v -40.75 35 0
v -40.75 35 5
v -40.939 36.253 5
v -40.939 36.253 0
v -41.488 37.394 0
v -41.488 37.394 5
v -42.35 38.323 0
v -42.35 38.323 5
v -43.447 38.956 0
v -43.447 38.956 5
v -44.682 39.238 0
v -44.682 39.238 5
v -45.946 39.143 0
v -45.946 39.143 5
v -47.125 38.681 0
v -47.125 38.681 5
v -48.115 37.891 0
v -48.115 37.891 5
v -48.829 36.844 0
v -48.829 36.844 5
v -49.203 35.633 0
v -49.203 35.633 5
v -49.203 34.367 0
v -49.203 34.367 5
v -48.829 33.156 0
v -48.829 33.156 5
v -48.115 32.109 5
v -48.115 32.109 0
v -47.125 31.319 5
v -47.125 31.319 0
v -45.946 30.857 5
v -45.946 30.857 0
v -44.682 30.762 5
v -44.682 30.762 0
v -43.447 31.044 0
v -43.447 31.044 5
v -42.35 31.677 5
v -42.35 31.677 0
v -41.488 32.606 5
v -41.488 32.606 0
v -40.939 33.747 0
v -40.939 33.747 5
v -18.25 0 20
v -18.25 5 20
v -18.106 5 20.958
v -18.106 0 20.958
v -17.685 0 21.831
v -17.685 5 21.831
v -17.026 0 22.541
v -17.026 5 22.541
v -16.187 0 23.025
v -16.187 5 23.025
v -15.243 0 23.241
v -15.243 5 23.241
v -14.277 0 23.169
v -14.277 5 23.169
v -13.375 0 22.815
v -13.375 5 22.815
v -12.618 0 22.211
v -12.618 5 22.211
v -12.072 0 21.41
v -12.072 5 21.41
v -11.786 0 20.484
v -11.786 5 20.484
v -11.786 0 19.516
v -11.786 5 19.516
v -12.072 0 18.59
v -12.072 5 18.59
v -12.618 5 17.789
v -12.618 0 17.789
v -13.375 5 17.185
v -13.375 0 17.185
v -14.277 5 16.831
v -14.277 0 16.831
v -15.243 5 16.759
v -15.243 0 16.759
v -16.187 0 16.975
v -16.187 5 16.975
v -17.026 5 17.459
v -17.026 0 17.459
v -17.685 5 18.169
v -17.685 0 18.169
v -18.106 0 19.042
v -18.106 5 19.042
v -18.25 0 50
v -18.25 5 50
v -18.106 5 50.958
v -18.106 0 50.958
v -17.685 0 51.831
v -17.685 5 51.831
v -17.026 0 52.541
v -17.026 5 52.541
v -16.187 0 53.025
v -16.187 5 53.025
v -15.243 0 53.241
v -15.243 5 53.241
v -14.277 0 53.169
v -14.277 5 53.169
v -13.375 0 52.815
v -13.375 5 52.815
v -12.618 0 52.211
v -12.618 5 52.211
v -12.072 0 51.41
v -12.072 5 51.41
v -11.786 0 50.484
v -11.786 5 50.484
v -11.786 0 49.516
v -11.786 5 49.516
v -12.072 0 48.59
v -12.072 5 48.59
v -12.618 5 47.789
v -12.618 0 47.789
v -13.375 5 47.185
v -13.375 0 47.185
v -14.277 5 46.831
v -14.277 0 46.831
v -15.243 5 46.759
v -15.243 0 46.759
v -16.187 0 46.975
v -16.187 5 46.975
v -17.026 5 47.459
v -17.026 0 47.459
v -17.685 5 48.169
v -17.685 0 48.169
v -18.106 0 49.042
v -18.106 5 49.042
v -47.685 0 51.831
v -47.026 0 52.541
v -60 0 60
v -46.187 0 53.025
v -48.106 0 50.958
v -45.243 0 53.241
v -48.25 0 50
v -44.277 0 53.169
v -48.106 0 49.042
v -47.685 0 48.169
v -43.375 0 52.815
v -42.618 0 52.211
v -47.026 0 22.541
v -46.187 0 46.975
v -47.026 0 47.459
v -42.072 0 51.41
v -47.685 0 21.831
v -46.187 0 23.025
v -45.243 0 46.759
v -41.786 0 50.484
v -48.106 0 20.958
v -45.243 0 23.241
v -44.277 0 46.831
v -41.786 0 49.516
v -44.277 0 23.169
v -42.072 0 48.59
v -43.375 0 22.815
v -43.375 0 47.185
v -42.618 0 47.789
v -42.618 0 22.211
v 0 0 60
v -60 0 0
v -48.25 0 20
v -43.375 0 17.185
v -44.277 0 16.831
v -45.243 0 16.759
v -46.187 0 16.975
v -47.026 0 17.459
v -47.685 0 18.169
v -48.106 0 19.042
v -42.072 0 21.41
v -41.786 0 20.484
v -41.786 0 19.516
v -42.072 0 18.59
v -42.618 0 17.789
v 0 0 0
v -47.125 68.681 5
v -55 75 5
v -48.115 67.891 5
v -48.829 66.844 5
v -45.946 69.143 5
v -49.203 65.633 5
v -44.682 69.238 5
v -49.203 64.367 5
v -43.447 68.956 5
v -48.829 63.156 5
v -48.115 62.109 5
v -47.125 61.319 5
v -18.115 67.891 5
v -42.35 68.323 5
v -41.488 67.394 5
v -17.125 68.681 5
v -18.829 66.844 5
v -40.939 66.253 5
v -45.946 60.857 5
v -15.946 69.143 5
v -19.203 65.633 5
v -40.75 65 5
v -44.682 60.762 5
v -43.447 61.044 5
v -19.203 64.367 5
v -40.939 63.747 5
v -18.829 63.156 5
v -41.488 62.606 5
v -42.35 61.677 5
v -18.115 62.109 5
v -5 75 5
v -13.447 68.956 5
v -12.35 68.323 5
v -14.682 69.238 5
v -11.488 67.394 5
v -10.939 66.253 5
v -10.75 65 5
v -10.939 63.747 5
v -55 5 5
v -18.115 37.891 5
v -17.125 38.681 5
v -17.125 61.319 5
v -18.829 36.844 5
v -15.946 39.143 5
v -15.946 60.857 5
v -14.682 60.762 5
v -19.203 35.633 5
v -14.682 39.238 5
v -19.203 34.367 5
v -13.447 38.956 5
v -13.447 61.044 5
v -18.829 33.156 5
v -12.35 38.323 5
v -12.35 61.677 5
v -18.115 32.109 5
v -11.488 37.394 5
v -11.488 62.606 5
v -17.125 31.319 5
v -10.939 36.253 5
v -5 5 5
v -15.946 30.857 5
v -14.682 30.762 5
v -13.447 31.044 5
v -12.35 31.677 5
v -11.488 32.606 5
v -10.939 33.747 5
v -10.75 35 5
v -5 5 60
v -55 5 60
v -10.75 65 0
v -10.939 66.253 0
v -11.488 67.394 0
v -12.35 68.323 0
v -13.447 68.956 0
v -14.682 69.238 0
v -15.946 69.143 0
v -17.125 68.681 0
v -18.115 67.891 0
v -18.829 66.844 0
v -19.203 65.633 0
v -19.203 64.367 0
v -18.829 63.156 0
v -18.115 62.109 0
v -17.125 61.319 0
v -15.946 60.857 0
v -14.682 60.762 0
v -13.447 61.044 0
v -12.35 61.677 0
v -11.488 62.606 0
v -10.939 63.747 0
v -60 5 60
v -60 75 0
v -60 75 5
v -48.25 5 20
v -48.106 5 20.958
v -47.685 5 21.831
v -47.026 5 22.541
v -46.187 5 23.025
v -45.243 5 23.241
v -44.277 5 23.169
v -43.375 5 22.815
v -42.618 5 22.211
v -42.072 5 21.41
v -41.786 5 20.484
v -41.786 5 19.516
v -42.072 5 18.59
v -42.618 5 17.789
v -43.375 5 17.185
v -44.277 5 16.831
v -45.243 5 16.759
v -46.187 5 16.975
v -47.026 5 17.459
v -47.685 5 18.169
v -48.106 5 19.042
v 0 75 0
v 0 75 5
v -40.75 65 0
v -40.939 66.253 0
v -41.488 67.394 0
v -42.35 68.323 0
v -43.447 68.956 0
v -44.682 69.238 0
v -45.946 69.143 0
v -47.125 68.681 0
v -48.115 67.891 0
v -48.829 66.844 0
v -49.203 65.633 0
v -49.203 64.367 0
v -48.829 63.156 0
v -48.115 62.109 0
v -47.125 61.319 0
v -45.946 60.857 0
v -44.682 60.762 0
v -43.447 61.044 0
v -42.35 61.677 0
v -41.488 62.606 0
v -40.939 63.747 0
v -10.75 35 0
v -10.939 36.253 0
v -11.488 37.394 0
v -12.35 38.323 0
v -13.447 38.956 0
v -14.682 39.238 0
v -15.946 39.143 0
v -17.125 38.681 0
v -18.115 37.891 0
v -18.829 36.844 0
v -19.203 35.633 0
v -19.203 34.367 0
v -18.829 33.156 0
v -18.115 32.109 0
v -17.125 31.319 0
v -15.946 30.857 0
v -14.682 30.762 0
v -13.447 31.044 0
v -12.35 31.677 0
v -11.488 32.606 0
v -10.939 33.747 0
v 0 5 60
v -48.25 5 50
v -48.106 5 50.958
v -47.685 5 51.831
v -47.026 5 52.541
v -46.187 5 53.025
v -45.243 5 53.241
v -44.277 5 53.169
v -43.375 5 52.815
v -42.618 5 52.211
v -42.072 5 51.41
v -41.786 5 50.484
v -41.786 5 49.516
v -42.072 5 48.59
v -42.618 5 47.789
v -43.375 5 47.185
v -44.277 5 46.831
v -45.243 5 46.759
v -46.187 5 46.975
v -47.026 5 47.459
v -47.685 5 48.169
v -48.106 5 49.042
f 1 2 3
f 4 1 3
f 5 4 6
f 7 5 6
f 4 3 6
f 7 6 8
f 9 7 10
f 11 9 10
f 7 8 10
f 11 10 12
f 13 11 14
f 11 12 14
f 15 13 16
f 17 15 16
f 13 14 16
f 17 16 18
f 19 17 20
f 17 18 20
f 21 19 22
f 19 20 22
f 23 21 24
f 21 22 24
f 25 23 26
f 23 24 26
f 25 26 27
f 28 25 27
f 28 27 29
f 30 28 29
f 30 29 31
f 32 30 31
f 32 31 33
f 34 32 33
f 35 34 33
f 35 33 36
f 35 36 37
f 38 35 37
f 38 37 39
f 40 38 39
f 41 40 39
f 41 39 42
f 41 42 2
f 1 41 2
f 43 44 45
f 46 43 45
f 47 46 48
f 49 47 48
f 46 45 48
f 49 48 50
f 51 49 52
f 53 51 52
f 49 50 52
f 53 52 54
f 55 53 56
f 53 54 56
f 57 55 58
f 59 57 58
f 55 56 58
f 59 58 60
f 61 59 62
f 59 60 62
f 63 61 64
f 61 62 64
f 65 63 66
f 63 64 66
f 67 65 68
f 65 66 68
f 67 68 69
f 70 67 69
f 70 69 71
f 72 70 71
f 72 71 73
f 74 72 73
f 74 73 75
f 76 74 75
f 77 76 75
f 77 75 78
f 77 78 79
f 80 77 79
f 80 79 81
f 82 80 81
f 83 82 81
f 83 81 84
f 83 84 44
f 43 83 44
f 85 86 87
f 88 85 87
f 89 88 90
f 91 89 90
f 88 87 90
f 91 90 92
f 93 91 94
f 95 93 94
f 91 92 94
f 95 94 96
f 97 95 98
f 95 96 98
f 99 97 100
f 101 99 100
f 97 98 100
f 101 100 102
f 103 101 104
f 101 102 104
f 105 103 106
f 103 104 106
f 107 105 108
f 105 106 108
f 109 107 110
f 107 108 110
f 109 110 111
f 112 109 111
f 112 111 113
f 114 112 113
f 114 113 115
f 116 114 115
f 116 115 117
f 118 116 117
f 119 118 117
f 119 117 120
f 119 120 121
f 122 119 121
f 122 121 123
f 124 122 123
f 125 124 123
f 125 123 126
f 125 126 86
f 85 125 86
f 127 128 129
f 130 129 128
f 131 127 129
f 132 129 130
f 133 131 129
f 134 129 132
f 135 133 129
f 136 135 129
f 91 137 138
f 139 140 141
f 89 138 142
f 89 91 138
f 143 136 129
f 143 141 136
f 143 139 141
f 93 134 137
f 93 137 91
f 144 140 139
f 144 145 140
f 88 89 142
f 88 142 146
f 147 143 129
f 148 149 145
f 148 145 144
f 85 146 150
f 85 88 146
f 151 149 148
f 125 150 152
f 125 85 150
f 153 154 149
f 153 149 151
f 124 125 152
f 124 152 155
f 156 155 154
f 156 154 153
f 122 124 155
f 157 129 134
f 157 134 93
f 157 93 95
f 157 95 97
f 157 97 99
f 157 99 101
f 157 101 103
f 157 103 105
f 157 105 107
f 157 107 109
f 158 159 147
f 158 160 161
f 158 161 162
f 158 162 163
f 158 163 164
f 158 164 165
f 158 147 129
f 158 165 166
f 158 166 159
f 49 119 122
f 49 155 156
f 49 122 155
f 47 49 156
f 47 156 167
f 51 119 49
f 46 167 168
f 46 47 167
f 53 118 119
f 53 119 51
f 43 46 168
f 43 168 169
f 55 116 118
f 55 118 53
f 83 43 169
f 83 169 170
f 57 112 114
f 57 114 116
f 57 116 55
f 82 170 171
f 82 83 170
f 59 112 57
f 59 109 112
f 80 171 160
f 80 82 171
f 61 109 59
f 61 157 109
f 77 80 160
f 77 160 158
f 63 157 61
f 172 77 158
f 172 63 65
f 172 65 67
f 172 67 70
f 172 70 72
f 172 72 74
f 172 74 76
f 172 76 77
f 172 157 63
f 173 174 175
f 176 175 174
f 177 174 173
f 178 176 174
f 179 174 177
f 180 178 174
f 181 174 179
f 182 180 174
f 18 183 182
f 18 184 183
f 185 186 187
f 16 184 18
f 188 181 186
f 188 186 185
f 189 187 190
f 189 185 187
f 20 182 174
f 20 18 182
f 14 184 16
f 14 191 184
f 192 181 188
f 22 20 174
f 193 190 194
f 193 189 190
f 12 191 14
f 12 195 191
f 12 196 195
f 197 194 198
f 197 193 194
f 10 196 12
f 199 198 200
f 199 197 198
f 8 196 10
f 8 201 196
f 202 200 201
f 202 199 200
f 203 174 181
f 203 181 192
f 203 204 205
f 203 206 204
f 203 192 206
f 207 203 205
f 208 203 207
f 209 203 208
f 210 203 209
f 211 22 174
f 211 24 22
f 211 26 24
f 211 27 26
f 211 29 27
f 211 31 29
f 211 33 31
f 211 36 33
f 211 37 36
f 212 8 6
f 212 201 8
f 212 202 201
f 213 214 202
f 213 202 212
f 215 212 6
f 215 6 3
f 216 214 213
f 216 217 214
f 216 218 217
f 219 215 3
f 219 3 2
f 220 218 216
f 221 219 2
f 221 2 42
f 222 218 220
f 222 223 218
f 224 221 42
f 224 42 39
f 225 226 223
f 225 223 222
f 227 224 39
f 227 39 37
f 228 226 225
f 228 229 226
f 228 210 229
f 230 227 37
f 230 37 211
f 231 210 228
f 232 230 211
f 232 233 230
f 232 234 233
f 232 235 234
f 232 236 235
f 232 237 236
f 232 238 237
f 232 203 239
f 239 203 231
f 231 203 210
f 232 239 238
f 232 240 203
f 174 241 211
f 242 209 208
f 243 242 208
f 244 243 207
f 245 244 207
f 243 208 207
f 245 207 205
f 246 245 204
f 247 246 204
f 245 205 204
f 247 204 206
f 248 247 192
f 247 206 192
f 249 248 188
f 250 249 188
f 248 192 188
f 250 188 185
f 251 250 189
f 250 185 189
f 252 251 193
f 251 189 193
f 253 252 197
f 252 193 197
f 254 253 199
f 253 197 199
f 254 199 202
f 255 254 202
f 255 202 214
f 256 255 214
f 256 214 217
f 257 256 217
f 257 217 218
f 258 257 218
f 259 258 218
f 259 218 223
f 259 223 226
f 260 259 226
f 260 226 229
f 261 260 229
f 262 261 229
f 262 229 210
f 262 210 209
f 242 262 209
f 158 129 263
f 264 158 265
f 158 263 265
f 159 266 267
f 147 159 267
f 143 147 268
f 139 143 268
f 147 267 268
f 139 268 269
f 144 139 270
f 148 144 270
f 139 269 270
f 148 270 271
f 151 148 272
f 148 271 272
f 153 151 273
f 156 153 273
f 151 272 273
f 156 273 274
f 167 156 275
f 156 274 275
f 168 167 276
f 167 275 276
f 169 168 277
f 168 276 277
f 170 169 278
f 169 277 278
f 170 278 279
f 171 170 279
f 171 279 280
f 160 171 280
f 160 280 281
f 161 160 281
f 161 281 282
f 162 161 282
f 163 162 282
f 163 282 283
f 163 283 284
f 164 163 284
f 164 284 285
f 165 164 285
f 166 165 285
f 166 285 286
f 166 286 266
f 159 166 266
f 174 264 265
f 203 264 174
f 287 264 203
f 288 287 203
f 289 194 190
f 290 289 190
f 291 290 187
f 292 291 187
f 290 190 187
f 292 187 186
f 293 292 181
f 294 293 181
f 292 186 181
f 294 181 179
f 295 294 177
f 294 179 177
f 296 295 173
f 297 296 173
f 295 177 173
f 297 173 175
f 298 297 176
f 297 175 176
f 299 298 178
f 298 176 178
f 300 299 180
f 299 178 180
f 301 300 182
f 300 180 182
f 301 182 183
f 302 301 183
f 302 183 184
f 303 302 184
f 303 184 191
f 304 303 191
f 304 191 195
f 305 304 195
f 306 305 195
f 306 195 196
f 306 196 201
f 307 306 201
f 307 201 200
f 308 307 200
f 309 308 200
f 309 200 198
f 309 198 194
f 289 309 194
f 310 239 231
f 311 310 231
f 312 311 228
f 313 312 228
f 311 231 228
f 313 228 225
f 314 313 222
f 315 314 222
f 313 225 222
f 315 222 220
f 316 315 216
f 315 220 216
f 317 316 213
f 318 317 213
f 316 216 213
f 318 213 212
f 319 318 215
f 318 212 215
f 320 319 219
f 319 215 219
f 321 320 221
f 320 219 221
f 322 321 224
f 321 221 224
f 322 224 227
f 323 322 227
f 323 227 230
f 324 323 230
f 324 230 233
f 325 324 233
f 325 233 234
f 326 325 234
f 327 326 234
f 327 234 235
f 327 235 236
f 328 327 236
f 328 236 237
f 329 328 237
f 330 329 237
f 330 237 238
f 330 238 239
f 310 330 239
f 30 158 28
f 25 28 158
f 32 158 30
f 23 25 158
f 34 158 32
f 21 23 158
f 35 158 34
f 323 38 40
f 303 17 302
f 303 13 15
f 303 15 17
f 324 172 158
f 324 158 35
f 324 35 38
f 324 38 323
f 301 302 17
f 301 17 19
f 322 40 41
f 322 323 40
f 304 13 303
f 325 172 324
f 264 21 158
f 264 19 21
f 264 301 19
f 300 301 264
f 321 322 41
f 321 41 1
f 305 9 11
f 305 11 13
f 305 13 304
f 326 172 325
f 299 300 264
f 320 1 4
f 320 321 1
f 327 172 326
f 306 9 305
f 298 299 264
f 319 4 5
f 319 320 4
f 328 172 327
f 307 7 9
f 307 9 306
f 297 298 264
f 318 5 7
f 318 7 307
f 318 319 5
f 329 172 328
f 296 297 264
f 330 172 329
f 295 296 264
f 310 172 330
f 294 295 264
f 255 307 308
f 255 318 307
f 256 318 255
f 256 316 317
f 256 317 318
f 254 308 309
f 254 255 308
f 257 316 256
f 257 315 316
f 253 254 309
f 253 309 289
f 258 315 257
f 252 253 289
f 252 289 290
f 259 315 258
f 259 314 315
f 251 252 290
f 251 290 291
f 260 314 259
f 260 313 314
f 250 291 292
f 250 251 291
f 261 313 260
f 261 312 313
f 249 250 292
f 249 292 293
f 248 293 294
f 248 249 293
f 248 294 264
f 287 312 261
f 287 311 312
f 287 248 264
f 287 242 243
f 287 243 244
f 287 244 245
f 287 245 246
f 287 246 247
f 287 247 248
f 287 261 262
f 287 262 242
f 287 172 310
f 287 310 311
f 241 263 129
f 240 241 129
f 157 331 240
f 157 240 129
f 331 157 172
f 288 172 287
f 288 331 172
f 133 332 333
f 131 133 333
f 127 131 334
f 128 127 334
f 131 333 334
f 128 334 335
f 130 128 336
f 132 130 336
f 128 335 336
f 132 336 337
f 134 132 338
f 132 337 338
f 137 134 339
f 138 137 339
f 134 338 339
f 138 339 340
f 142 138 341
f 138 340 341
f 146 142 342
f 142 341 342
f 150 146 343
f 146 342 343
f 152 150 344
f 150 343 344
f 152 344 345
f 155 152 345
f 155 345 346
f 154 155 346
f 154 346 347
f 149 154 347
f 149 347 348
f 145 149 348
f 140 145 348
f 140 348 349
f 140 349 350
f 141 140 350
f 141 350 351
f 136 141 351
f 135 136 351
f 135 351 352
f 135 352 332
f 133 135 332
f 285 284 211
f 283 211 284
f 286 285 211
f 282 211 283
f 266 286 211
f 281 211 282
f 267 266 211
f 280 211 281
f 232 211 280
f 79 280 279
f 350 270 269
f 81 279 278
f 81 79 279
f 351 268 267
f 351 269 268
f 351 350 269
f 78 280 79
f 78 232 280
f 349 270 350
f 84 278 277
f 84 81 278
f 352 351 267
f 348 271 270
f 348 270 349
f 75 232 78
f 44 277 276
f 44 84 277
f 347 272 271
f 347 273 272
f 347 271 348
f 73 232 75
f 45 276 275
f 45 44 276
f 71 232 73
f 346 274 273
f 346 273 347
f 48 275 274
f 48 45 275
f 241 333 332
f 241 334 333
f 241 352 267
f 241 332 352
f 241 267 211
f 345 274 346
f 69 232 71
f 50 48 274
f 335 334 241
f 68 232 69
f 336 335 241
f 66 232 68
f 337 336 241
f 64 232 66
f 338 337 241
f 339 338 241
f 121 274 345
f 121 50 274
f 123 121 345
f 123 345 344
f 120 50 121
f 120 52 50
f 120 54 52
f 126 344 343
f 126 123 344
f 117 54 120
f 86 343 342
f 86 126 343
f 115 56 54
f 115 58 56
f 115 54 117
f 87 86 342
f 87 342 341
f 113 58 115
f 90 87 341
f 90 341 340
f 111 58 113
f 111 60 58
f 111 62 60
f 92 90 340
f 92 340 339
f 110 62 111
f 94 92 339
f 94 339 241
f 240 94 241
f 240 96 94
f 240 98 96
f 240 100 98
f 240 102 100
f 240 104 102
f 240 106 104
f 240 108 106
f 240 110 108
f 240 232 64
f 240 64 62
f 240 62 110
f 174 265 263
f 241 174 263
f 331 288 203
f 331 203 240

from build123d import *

# Parameters (mm, degrees)
F1_DEPTH  = 60
F3_DEPTH  = 5
F6_DEPTH  = 5
F7_R      = 4.25
F8_DEPTH  = 25
F9_R      = 3.25
F10_DEPTH = 25


with BuildPart() as f1:
    # F0 (on Right) → F1 (new body)
    with BuildSketch(Plane.YZ):
        Polygon((0, 60), (0, 0), (75, 0), (75, 5), (5, 5), (5, 60), align=None)
    extrude(amount=-F1_DEPTH)

    # F2 (on Right) → F3 (join)
    with BuildSketch(Plane.YZ):
        Polygon((75, 5), (5, 60), (5, 5), align=None)
    extrude(amount=-F3_DEPTH)

    # F5 (on offset) → F6 (join)
    with BuildSketch(Plane.YZ.offset(-60)):
        Polygon((75, 5), (5, 60), (5, 5), align=None)
    extrude(amount=F6_DEPTH)

    # F7 (on face) → F8 (cut)
    with BuildSketch(Plane.XY.offset(5)):
        with Locations((-15, 35)):
            Circle(F7_R)
        with Locations((-15, 65)):
            Circle(F7_R)
        with Locations((-45, 65)):
            Circle(F7_R)
        with Locations((-45, 35)):
            Circle(F7_R)
    extrude(amount=-F8_DEPTH, mode=Mode.SUBTRACT)

    # F9 (on face) → F10 (cut)
    with BuildSketch(Plane(origin=(0, 5, 0), x_dir=(-1, 0, 0), z_dir=(0, 1, 0))):
        with Locations((45, 20)):
            Circle(F9_R)
        with Locations((45, 50)):
            Circle(F9_R)
        with Locations((15, 50)):
            Circle(F9_R)
        with Locations((15, 20)):
            Circle(F9_R)
    extrude(amount=-F10_DEPTH, mode=Mode.SUBTRACT)


solid = f1.part
